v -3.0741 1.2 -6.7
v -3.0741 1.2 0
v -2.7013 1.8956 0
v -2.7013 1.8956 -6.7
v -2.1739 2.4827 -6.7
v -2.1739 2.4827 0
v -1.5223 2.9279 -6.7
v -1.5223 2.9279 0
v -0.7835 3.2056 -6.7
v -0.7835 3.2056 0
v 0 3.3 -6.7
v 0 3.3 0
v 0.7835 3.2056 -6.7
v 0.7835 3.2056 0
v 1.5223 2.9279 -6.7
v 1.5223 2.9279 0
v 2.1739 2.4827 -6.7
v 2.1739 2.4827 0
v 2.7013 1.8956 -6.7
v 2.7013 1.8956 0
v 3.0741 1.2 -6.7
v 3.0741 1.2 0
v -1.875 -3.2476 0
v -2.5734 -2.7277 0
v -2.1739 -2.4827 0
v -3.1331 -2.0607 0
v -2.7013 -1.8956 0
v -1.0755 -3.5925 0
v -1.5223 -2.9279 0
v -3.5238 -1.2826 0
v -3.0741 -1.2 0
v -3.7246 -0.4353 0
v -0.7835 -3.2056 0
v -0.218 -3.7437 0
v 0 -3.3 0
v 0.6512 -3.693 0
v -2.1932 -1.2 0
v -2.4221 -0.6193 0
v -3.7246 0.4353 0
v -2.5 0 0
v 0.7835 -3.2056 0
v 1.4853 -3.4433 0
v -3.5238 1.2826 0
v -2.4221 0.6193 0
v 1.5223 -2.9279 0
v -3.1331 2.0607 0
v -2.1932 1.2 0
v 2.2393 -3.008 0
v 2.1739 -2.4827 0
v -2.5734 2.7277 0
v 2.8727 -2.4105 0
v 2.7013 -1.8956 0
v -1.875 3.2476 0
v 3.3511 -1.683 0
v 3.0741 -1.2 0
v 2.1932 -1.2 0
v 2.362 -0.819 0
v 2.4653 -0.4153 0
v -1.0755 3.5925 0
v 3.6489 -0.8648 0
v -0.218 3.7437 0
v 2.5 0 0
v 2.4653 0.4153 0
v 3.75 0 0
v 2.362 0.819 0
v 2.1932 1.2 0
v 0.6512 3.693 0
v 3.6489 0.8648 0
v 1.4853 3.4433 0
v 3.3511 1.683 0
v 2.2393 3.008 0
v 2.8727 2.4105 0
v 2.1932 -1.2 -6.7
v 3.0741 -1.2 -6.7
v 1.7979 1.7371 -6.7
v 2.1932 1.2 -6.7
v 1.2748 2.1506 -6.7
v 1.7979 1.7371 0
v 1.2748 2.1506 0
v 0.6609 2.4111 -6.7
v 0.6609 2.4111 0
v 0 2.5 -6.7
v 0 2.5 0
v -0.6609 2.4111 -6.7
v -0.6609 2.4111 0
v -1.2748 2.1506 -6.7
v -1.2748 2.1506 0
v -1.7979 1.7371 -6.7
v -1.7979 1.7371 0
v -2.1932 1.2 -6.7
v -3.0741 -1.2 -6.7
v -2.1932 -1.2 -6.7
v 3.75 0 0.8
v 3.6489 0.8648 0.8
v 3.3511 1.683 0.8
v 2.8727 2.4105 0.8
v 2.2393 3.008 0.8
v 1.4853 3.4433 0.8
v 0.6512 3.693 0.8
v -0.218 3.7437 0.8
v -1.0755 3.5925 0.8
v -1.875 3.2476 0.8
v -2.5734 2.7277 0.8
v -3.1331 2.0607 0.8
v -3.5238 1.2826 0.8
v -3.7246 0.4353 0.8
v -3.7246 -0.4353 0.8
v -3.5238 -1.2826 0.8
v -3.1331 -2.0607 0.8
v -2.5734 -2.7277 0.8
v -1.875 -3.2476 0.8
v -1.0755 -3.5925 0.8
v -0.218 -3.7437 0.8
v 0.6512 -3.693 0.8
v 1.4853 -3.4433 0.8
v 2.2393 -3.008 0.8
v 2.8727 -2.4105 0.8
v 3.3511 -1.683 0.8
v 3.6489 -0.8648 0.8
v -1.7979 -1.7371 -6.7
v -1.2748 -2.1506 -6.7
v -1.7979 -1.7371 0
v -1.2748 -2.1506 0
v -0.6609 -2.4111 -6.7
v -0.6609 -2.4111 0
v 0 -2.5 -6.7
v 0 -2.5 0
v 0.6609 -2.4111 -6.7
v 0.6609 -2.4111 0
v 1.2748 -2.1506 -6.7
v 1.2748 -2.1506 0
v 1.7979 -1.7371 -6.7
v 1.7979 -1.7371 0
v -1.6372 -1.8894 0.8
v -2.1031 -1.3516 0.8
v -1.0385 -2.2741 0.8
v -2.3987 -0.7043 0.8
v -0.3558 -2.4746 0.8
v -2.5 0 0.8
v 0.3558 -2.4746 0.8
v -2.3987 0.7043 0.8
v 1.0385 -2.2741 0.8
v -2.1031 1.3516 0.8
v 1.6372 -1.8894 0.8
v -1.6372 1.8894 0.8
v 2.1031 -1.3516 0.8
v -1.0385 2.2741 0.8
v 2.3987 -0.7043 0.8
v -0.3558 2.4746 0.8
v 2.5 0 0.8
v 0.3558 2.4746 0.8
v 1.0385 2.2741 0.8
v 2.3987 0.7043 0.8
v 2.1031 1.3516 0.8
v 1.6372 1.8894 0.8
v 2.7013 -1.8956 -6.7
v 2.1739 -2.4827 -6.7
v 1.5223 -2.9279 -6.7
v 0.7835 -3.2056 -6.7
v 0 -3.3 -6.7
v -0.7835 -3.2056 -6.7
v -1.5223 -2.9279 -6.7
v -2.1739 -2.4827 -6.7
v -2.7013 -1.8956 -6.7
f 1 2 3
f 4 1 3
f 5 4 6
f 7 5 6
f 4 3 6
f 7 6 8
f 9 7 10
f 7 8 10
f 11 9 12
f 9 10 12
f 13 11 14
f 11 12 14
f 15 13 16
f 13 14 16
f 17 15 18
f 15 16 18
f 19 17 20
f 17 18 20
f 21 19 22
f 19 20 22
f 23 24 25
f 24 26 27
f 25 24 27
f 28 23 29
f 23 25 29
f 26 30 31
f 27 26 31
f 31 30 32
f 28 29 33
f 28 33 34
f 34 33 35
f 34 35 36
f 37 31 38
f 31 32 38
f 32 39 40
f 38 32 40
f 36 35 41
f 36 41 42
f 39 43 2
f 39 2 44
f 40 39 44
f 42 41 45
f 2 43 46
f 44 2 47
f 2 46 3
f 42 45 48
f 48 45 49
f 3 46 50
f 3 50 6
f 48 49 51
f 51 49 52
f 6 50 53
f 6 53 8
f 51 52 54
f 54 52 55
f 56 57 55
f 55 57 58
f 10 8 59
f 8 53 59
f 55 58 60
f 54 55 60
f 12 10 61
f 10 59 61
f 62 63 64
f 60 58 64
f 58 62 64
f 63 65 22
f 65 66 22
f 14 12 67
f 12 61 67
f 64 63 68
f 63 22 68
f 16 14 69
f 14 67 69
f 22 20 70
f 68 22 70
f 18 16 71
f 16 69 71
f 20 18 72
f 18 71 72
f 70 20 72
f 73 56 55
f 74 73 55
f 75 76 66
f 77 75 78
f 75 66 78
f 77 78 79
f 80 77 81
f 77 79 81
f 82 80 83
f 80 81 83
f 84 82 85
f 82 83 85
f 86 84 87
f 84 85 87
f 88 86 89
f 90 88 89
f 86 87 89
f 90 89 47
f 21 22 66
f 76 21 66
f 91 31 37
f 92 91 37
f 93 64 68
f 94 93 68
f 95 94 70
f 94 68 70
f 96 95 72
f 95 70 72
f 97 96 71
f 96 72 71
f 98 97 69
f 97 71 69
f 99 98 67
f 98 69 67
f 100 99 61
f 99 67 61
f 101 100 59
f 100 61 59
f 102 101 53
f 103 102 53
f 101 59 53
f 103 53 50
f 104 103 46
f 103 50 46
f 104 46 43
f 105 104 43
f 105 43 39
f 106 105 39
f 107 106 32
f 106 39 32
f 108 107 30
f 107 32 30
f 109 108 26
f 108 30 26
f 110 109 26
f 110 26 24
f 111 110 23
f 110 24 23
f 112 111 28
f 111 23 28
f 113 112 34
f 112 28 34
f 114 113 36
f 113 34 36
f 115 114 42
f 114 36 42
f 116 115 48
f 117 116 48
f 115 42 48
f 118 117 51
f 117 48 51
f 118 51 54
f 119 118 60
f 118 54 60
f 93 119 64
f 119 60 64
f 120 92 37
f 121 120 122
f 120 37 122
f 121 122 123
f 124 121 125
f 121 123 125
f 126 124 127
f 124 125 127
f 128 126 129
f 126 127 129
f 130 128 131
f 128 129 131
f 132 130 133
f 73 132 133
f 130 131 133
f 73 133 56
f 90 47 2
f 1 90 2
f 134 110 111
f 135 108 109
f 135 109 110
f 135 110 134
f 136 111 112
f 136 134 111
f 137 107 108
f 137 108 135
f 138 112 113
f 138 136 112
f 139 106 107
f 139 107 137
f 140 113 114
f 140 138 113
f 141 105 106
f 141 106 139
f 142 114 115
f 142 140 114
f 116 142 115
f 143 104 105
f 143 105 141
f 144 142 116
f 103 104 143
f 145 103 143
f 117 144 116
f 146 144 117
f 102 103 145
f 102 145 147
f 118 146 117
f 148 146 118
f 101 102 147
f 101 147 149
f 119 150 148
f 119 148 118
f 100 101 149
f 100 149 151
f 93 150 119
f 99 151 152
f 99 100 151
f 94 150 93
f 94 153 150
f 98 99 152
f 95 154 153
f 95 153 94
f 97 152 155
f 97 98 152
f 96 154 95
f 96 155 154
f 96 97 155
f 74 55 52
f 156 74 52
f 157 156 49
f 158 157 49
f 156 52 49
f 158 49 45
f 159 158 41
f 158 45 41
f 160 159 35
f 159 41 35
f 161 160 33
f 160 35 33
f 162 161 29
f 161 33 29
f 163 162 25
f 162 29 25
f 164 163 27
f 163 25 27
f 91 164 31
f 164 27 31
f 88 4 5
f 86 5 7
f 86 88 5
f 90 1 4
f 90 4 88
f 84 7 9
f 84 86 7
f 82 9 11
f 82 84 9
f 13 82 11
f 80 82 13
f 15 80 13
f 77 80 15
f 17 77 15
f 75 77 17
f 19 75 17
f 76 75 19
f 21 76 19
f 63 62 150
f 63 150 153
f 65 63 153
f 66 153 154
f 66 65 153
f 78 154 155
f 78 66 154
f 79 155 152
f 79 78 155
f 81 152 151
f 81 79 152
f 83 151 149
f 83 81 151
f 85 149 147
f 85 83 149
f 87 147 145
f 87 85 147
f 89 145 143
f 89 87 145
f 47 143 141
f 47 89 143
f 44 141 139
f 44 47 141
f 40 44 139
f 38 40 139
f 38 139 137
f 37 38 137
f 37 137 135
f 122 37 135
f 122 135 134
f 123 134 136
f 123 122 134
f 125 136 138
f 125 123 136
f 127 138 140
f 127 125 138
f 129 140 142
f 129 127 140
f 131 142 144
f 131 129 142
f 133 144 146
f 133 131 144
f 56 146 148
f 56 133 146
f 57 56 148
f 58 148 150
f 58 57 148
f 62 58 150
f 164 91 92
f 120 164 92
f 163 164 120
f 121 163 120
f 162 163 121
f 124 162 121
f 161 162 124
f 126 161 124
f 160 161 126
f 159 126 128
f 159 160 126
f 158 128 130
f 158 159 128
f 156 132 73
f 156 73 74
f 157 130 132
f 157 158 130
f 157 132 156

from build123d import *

# Parameters (mm, degrees)
F0_R     = 3.75
F0_R_2   = 2.5
F1_DEPTH = 0.8
F3_DEPTH = 6.7


with BuildPart() as f1:
    # F0 (on Top) → F1 (new body)
    with BuildSketch(Plane.XY):
        Circle(F0_R)
        Circle(F0_R_2, mode=Mode.SUBTRACT)
    extrude(amount=F1_DEPTH)

    # F2 (on face) → F3 (join)
    with BuildSketch(Plane(origin=(0, 0, 0), x_dir=(1, 0, 0), z_dir=(0, 0, -1))):
        with BuildLine():
            Line((-2.193171, -1.2), (-3.074085, -1.2))
            ThreePointArc((-3.074085, -1.2), (0, -3.3), (3.074085, -1.2))
            Line((3.074085, -1.2), (2.193171, -1.2))
            ThreePointArc((2.193171, -1.2), (0, -2.5), (-2.193171, -1.2))
        make_face()
        with BuildLine():
            ThreePointArc((3.074085, 1.2), (0, 3.3), (-3.074085, 1.2))
            Line((-3.074085, 1.2), (-2.193171, 1.2))
            ThreePointArc((-2.193171, 1.2), (0, 2.5), (2.193171, 1.2))
            Line((2.193171, 1.2), (3.074085, 1.2))
        make_face()
    extrude(amount=F3_DEPTH)


solid = f1.part
